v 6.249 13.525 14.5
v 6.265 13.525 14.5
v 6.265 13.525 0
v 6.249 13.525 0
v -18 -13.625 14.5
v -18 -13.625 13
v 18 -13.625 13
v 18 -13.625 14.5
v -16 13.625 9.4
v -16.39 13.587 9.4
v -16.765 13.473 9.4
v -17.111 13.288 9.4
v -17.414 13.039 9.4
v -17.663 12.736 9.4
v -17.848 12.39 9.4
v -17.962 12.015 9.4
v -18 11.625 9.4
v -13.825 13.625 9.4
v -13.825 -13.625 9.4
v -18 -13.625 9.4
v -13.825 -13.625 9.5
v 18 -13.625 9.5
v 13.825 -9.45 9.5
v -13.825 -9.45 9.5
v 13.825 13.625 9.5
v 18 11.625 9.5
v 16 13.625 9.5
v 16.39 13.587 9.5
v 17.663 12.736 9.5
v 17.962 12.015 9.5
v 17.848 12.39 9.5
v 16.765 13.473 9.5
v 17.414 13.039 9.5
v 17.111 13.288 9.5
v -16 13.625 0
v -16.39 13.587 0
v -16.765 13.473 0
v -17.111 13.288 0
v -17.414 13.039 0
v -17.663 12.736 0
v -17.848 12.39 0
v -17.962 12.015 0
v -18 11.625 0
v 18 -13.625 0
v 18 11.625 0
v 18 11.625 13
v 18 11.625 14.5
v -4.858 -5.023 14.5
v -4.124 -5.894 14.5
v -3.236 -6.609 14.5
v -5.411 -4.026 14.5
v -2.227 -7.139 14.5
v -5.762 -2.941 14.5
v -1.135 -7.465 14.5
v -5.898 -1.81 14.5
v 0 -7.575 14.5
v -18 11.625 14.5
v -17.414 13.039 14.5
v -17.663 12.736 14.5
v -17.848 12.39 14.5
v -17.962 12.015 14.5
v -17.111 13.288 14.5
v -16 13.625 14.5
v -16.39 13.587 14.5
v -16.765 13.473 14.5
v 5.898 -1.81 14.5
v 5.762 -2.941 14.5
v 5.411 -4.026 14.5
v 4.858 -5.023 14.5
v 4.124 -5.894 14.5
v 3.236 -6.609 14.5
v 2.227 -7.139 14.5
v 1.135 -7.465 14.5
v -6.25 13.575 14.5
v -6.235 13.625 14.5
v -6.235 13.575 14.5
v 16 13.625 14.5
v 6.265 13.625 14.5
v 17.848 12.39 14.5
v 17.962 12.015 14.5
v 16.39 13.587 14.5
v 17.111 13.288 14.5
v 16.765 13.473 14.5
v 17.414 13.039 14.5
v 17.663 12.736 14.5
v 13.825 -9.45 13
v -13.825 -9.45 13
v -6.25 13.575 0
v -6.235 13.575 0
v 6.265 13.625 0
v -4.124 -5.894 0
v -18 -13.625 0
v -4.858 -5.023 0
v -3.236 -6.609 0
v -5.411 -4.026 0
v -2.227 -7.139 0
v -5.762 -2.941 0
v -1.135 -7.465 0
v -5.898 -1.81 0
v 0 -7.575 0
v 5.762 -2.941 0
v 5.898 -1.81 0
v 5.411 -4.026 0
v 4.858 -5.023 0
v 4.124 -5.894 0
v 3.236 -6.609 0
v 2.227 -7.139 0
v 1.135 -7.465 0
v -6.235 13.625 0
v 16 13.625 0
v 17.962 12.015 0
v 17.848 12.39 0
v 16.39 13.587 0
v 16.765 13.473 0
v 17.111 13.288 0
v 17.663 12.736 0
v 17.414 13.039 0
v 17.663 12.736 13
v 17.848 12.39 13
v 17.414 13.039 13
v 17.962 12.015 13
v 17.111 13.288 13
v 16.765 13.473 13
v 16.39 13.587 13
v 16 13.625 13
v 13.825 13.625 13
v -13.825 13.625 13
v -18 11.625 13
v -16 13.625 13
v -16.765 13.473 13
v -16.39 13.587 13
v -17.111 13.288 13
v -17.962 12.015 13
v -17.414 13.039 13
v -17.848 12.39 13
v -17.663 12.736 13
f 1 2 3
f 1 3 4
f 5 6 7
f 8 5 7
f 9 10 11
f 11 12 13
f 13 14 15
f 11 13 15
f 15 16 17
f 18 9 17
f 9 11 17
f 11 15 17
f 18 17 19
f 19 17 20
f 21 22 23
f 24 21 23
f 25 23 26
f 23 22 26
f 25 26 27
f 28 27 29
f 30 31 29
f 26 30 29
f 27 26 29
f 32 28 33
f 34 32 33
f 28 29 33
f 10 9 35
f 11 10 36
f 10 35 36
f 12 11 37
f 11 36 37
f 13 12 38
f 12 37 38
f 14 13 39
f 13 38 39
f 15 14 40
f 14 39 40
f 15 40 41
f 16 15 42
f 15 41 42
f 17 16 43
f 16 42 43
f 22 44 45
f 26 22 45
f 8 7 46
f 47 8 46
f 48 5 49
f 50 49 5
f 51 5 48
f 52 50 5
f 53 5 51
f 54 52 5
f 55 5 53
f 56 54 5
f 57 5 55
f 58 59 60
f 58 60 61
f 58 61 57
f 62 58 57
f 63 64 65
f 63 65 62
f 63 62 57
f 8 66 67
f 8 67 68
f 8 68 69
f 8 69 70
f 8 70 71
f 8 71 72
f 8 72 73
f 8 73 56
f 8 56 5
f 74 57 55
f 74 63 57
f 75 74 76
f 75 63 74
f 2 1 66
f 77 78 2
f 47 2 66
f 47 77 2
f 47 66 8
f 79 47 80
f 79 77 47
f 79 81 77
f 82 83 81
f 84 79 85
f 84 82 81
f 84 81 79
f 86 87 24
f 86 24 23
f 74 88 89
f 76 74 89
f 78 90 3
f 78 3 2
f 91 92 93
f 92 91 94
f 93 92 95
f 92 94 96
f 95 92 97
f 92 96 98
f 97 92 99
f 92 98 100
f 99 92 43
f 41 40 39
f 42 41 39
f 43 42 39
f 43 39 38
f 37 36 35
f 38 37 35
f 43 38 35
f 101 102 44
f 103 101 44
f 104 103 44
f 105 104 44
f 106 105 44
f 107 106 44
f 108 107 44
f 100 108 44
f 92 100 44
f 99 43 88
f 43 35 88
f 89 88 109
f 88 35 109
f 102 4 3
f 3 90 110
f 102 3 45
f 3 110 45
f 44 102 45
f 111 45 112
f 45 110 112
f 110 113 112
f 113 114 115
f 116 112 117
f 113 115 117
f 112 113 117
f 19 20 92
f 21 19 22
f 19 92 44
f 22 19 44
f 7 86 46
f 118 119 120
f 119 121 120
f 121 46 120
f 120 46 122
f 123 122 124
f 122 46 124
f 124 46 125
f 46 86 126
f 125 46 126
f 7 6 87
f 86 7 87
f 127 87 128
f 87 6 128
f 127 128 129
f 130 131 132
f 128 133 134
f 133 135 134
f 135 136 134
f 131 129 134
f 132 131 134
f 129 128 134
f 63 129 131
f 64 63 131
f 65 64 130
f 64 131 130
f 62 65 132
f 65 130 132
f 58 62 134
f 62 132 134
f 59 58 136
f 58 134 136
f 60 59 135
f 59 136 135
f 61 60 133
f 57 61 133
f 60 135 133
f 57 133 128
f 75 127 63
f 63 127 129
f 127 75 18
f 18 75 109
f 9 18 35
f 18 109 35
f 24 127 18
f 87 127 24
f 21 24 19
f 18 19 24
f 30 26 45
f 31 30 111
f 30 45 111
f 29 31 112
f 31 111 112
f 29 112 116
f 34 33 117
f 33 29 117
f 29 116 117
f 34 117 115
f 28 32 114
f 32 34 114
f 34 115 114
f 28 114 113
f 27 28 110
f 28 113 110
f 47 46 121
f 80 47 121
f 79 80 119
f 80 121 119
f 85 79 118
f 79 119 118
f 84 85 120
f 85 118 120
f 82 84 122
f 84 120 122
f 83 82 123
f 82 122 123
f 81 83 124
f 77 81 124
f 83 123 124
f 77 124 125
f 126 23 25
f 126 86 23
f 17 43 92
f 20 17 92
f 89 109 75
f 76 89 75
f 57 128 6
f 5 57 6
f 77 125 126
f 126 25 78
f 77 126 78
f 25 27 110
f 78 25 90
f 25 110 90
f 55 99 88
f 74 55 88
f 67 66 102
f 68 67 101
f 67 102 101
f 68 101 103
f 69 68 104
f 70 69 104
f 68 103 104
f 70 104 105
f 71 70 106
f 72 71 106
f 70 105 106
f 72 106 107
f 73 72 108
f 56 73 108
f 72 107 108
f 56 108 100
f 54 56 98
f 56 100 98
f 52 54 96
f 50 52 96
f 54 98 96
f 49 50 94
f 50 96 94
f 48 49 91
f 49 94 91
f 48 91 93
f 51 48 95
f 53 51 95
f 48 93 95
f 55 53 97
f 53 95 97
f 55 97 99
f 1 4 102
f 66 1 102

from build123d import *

# Parameters (mm, degrees)
F1_DEPTH = 14.5
F2_W     = 12.5
F2_H     = 14.5
F3_DEPTH = 0.1
F4_W     = 2
F4_H     = 3.5
F4_W_2   = 25.25
F5_DEPTH = 4.175
F6_W     = 2
F6_H     = 3.6
F6_W_2   = 25.25
F7_DEPTH = 4.175
F8_W     = 27.65
F8_H     = 3.5
F9_DEPTH = 4.175


with BuildPart() as f1:
    # F0 (on Top) → F1 (new body)
    with BuildSketch(Plane.XY):
        with BuildLine():
            Line((-18, 11.625), (-18, -13.625))
            Line((-18, -13.625), (18, -13.625))
            Line((18, -13.625), (18, 11.625))
            ThreePointArc((18, 11.625), (17.4142135624, 13.0392135624), (16, 13.625))
            Line((16, 13.625), (-16, 13.625))
            ThreePointArc((-16, 13.625), (-17.4142135624, 13.0392135624), (-18, 11.625))
        make_face()
        with BuildLine():
            ThreePointArc((5.8984604593, -1.8097746648), (0, -7.575), (-5.8984604593, -1.8097746648))
            Line((-5.8984604593, -1.8097746648), (-6.25, 13.5754765943))
            Line((-6.25, 13.5754765943), (6.25, 13.5754765943))
            Line((6.25, 13.5754765943), (5.8984604593, -1.8097746648))
        make_face(mode=Mode.SUBTRACT)
    extrude(amount=F1_DEPTH)

    # F2 (on face) → F3 (cut)
    with BuildSketch(Plane(origin=(0, 13.625, 0), x_dir=(-1, 0, 0), z_dir=(0, 1, 0))):
        with Locations((-0.0153454952, 7.25)):
            Rectangle(F2_W, F2_H)
    extrude(amount=-F3_DEPTH, mode=Mode.SUBTRACT)

    # F4 (on face) → F5 (cut)
    with BuildSketch(Plane.YZ.offset(18)):
        with Locations((12.625, 11.25)):
            Rectangle(F4_W, F4_H)
        with Locations((-1, 11.25)):
            Rectangle(F4_W_2, F4_H)
    extrude(amount=-F5_DEPTH, mode=Mode.SUBTRACT)

    # F6 (on face) → F7 (cut)
    with BuildSketch(Plane(origin=(-18, 0, 0), x_dir=(0, -1, 0), z_dir=(-1, 0, 0))):
        with Locations((-12.625, 11.2)):
            Rectangle(F6_W, F6_H)
        with Locations((1, 11.2)):
            Rectangle(F6_W_2, F6_H)
    extrude(amount=-F7_DEPTH, mode=Mode.SUBTRACT)

    # F8 (on face) → F9 (cut)
    with BuildSketch(Plane.XZ.offset(13.625)):
        with Locations((0, 11.25)):
            Rectangle(F8_W, F8_H)
    extrude(amount=-F9_DEPTH, mode=Mode.SUBTRACT)


solid = f1.part
